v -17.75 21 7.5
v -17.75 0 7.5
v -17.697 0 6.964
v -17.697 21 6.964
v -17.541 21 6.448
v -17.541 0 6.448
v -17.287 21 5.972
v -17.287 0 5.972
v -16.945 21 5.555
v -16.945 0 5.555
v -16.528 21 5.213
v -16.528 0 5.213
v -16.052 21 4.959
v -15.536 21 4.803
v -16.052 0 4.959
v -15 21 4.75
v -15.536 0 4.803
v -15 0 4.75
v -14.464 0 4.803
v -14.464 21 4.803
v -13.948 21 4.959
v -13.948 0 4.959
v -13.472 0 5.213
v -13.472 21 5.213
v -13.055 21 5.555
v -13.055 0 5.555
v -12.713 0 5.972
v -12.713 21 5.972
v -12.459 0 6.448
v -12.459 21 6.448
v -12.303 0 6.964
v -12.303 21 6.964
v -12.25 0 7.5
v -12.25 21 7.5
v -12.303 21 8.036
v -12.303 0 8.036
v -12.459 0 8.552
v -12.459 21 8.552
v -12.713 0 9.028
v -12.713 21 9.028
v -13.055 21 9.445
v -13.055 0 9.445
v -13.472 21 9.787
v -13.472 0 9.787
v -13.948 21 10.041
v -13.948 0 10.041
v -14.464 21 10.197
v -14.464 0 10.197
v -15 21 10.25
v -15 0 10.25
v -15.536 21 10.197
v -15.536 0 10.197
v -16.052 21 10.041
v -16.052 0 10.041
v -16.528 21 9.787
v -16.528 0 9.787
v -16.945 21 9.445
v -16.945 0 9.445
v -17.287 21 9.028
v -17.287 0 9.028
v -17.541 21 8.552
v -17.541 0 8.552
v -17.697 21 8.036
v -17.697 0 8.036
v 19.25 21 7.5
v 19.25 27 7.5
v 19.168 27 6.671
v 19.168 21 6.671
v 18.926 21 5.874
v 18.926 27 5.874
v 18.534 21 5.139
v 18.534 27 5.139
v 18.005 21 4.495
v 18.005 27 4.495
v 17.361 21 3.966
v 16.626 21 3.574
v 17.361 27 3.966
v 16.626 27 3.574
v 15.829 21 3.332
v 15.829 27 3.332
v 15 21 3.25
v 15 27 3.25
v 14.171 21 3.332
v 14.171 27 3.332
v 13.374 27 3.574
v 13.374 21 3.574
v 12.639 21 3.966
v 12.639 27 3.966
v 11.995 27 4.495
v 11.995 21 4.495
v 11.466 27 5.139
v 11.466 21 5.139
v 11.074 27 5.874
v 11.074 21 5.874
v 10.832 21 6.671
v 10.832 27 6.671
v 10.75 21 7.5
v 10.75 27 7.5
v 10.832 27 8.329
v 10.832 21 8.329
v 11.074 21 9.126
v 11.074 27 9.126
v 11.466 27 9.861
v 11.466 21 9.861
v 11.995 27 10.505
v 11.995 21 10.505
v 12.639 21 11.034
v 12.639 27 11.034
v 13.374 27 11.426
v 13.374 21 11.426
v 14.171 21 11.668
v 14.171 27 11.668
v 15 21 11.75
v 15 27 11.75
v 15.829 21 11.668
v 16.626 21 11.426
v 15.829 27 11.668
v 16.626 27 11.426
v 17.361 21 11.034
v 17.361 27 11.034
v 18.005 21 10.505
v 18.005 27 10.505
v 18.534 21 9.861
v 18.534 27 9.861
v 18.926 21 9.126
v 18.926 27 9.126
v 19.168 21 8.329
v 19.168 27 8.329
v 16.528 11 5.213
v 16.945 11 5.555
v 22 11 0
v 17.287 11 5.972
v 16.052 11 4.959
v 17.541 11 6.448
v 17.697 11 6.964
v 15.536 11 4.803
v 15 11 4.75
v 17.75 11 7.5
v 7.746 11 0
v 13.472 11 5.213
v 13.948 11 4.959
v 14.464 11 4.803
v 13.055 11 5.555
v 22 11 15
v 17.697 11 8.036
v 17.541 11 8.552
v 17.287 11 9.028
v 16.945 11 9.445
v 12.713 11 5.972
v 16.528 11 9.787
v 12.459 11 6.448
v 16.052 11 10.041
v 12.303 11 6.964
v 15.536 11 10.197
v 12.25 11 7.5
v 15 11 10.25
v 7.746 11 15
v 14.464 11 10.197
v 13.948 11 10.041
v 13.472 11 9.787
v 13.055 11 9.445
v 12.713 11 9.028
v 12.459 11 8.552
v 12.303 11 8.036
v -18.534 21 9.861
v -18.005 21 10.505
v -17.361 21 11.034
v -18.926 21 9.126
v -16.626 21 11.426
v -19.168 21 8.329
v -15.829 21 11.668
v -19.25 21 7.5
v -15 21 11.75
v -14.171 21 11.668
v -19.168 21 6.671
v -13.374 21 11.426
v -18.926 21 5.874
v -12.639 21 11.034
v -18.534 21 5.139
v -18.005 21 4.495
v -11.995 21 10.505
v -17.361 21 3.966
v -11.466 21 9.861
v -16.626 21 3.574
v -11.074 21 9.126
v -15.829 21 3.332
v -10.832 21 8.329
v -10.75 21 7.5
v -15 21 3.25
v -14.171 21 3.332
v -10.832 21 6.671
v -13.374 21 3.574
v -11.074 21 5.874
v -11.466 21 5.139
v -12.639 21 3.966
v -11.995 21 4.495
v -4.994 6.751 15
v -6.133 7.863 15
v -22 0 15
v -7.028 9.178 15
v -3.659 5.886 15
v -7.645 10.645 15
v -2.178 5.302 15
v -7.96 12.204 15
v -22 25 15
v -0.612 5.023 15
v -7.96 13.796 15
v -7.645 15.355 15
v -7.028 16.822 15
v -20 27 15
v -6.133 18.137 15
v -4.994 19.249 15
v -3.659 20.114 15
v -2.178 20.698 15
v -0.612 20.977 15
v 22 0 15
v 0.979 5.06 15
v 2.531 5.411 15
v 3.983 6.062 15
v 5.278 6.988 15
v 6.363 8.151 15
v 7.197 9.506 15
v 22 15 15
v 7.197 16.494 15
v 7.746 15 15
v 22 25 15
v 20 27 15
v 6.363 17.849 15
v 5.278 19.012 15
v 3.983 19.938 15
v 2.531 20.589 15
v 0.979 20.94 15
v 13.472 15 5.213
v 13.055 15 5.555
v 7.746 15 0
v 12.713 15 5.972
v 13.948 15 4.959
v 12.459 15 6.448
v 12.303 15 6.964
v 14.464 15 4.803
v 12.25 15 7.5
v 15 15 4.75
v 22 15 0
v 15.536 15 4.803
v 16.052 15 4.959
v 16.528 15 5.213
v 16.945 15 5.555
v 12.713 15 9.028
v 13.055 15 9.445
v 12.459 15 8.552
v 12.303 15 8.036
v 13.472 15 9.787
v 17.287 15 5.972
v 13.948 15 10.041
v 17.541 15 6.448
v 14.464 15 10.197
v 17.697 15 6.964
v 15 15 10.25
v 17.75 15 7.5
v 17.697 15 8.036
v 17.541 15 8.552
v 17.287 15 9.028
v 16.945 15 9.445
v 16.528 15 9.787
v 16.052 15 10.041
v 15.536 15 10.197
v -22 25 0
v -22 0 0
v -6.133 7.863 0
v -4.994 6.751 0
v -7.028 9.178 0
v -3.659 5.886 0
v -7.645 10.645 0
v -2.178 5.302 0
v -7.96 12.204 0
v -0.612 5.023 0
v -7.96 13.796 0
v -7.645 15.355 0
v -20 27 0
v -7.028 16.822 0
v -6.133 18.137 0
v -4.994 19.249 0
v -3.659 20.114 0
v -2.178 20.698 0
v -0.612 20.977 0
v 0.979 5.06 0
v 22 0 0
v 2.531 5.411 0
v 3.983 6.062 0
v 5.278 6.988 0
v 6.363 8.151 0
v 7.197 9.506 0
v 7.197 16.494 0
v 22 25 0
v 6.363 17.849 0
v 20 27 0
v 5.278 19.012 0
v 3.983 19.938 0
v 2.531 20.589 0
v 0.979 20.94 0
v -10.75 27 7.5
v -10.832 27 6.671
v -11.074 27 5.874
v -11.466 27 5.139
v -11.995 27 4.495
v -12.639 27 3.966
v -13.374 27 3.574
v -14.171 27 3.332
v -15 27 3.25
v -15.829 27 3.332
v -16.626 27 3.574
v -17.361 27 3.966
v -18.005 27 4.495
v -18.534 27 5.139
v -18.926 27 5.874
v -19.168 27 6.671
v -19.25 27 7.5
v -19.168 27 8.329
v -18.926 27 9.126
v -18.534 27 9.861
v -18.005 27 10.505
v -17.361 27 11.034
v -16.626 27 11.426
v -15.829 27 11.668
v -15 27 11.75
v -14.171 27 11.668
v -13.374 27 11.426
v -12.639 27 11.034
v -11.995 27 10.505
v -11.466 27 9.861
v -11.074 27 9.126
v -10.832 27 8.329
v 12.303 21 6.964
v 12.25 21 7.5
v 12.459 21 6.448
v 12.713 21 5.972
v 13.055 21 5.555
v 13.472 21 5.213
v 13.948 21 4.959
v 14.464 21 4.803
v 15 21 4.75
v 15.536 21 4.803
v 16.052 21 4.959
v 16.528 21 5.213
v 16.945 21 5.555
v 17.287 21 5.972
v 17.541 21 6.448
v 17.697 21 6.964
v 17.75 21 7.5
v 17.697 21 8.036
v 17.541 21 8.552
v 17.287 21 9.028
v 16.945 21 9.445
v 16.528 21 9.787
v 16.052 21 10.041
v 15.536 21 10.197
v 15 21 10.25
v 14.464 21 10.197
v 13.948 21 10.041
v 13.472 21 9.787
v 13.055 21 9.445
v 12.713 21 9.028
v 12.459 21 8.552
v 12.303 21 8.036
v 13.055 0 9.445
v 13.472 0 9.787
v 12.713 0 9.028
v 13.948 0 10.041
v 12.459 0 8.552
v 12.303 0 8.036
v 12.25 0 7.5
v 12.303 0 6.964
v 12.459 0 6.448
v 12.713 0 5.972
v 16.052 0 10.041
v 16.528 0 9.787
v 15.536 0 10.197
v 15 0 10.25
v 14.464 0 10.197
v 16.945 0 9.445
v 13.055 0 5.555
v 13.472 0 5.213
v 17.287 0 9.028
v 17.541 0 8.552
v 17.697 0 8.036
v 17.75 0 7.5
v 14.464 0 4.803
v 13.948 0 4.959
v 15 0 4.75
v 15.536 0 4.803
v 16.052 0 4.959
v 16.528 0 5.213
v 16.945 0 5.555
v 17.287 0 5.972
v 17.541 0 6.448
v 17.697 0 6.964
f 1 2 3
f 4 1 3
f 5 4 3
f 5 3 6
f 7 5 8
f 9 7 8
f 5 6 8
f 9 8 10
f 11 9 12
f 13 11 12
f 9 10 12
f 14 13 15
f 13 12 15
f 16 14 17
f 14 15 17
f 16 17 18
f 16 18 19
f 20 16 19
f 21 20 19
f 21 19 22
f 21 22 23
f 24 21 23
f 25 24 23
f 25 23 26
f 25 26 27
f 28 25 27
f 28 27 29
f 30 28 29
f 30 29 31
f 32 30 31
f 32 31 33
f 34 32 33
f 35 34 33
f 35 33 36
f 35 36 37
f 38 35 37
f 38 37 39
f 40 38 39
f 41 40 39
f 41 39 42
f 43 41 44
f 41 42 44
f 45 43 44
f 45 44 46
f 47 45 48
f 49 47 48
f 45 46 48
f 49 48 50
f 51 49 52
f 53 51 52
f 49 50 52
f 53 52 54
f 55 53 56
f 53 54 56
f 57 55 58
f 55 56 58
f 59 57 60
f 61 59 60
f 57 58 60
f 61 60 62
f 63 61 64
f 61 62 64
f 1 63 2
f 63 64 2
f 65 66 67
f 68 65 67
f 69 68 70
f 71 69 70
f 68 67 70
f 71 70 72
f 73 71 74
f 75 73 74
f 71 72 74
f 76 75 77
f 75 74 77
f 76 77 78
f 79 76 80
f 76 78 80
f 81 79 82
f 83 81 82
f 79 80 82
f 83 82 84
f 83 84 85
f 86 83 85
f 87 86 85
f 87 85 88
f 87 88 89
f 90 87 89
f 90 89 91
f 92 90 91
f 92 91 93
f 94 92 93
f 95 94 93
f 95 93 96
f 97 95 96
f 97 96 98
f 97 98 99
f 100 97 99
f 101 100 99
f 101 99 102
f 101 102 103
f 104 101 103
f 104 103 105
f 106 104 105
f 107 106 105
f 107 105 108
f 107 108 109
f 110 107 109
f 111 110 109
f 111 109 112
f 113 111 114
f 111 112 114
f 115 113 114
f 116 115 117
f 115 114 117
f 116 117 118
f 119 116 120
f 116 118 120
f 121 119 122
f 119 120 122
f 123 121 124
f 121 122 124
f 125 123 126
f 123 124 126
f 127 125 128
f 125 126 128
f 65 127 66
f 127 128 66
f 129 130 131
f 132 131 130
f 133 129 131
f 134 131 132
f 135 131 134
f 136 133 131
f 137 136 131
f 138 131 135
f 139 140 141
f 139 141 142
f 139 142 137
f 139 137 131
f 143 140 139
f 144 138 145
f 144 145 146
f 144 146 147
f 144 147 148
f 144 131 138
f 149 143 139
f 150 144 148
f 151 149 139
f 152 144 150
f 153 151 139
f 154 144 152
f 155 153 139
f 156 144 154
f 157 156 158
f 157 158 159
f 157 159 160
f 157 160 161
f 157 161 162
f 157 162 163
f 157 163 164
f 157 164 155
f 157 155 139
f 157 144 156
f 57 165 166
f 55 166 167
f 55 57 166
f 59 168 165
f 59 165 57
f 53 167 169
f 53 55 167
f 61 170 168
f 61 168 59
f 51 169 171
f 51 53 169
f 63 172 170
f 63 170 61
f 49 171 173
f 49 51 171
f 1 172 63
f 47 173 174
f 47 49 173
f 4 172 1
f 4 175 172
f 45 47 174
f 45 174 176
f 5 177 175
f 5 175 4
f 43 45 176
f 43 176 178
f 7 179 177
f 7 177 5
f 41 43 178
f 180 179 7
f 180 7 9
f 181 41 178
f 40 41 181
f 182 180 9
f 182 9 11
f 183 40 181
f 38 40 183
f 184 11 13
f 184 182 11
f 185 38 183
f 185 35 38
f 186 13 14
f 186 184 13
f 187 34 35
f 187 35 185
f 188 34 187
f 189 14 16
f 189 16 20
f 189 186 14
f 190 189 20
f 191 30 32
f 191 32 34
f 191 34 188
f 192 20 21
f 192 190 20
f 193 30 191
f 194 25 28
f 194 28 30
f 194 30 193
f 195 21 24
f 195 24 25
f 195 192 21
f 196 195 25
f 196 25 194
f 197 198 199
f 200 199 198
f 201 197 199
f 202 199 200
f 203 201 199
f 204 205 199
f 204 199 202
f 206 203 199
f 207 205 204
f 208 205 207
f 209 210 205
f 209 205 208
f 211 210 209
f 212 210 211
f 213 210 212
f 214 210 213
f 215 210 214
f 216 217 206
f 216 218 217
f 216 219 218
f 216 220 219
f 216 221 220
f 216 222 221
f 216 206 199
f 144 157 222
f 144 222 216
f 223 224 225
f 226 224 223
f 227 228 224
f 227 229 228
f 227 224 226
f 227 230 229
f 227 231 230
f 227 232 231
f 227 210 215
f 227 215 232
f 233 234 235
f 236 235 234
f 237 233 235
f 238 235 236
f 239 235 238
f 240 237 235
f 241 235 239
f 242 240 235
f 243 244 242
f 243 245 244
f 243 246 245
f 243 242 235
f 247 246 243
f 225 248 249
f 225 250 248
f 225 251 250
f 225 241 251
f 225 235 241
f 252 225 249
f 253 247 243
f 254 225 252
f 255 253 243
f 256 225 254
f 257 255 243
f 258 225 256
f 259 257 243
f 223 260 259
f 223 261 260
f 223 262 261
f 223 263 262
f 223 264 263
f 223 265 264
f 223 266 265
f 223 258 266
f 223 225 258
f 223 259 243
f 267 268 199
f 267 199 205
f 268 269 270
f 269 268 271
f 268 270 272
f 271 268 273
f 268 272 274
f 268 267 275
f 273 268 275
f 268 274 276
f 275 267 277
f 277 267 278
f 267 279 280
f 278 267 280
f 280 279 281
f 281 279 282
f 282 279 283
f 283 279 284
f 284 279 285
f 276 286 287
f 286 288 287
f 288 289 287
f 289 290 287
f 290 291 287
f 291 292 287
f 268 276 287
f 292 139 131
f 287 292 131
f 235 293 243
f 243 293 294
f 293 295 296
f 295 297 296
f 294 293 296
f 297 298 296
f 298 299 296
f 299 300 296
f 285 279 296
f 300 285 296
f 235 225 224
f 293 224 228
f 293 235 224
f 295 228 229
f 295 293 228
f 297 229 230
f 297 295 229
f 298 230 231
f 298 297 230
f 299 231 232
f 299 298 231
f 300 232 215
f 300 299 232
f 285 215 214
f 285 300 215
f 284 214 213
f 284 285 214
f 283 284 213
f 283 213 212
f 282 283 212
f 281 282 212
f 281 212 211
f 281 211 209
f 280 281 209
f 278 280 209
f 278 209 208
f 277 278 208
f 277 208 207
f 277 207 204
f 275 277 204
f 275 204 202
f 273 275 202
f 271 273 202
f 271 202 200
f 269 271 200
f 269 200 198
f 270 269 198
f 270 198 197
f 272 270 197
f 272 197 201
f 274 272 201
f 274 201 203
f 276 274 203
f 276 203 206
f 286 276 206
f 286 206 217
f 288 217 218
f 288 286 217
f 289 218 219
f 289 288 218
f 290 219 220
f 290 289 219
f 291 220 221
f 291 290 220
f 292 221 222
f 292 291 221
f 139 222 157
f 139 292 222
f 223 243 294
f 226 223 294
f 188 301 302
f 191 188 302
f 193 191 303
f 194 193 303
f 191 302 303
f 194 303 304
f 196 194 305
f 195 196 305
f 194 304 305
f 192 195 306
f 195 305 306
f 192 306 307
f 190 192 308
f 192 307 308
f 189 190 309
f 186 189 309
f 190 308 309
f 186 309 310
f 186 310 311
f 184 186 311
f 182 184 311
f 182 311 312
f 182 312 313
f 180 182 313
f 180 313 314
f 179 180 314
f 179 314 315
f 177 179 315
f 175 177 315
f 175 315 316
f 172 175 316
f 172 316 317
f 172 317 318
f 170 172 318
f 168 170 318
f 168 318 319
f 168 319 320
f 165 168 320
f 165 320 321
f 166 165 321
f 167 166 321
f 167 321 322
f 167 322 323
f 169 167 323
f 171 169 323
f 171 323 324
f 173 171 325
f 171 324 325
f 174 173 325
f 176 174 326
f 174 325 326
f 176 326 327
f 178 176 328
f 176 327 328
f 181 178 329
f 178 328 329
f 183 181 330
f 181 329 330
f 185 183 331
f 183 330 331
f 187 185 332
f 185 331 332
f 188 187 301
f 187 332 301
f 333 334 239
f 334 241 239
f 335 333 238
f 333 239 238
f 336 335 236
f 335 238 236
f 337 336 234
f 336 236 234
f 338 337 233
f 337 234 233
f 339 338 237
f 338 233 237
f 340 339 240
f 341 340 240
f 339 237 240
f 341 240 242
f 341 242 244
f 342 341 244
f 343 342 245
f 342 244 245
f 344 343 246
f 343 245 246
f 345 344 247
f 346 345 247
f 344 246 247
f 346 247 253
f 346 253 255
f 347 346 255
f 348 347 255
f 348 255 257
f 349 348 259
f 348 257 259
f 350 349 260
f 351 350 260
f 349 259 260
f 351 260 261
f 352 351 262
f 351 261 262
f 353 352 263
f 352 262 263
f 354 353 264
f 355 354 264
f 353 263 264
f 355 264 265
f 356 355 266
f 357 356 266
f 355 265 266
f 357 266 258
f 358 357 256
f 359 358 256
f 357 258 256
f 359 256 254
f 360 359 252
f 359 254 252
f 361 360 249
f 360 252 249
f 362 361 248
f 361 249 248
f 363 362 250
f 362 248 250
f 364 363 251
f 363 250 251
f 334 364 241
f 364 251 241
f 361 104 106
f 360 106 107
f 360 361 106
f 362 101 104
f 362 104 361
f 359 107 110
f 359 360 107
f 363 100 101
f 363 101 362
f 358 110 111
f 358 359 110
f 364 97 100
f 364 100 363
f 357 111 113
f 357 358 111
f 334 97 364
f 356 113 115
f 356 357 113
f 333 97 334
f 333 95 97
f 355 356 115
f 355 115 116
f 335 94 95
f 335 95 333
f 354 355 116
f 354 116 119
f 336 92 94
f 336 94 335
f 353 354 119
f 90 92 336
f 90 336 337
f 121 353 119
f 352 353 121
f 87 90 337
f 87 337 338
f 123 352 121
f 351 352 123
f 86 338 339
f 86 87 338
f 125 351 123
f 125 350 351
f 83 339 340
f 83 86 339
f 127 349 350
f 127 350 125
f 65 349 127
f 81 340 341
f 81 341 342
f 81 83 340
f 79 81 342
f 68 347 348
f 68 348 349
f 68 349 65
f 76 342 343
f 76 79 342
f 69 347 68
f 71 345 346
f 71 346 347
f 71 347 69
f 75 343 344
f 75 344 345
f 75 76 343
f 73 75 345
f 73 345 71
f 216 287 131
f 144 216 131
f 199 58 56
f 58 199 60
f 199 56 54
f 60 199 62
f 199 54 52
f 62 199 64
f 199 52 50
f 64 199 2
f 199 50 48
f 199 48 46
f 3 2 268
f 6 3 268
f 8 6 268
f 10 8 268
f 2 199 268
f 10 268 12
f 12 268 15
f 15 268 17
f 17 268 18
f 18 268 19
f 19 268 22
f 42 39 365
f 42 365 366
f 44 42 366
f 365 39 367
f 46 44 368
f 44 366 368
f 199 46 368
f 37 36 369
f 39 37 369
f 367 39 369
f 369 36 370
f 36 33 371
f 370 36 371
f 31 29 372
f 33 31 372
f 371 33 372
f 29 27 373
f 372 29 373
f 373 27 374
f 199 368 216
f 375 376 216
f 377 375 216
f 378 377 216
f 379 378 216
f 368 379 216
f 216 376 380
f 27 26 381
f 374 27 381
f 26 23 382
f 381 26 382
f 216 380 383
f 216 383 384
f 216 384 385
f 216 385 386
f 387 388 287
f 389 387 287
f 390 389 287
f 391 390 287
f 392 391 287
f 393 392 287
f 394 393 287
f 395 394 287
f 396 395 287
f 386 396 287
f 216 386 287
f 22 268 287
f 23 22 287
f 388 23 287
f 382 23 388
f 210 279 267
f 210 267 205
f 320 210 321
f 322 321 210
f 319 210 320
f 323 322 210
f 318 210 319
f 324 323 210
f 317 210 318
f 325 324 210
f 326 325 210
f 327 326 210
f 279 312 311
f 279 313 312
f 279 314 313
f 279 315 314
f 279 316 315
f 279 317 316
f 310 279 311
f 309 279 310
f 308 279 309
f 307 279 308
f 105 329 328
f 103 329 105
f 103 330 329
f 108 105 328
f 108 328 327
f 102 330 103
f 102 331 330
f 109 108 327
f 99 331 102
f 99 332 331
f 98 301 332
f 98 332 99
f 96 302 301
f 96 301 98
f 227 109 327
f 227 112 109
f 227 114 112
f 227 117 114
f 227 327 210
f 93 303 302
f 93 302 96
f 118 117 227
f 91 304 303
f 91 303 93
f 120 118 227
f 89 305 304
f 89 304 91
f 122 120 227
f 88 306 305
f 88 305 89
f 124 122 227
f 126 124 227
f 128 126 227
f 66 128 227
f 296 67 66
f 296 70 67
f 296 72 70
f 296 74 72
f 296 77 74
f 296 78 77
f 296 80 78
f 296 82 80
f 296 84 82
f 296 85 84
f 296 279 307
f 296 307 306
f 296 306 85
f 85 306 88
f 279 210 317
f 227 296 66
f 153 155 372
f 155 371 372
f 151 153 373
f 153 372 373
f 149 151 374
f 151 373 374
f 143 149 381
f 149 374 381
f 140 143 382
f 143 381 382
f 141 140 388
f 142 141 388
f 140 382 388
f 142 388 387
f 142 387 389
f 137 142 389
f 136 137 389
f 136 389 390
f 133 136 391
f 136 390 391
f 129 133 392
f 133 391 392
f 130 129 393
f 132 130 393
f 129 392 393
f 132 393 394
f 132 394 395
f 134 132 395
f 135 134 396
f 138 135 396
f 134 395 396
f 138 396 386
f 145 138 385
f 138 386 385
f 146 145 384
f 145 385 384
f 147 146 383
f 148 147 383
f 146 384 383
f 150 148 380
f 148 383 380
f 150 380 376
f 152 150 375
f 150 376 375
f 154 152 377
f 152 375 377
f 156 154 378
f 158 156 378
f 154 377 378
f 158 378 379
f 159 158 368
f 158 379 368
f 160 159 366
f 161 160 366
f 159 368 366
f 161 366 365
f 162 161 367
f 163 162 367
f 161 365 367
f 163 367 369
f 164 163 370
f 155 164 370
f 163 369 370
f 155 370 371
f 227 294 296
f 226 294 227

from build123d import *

# Parameters (mm, degrees)
SKETCH1_W                                           = 44
SKETCH1_H                                           = 27
SKETCH1_R                                           = 8
BOSS_EXTRUDE1_DEPTH                                 = 15
CBORE_FOR_M5_HEX_SOCKET_HEAD_CAP_SCREW1_D           = 5.5
CBORE_FOR_M5_HEX_SOCKET_HEAD_CAP_SCREW1_DEPTH       = 27
CBORE_FOR_M5_HEX_SOCKET_HEAD_CAP_SCREW1_CBORE_D     = 8.5
CBORE_FOR_M5_HEX_SOCKET_HEAD_CAP_SCREW1_CBORE_DEPTH = 6
CHAMFER1_SIZE                                       = 2
CUT_EXTRUDE1_REACH                                  = 17


with BuildPart() as part:
    # Sketch1 → Boss-Extrude1 (new body)
    with BuildSketch(Plane.XY):
        with Locations((0, 13.5)):
            Rectangle(SKETCH1_W, SKETCH1_H)
        with Locations((0, 13)):
            Circle(SKETCH1_R, mode=Mode.SUBTRACT)
    extrude(amount=BOSS_EXTRUDE1_DEPTH)

    # CBORE for M5 Hex Socket Head Cap Screw1
    with Locations(Plane(origin=(-15, 27, 7.5), x_dir=(1, 0, 0), z_dir=(0, 1, 0))):
        with Locations((0, 0), (30, 0)):
            CounterBoreHole(CBORE_FOR_M5_HEX_SOCKET_HEAD_CAP_SCREW1_D / 2, CBORE_FOR_M5_HEX_SOCKET_HEAD_CAP_SCREW1_CBORE_D / 2, CBORE_FOR_M5_HEX_SOCKET_HEAD_CAP_SCREW1_CBORE_DEPTH, depth=CBORE_FOR_M5_HEX_SOCKET_HEAD_CAP_SCREW1_DEPTH)

    # Chamfer1
    chamfer1_edges = [part.edges().sort_by_distance(p)[0] for p in [
        (-22, 27, 7.5),
        (22, 27, 7.5),
    ]]
    chamfer(chamfer1_edges, length=CHAMFER1_SIZE)

    # Sketch4 → Cut-Extrude1 (cut, up to next)
    with BuildSketch(Plane.XY.offset(15), mode=Mode.PRIVATE) as cut_extrude1_sk1:
        with BuildLine():
            Line((7.745966692, 15), (22, 15))
            Line((22, 15), (22, 11))
            Line((22, 11), (7.745966692, 11))
            ThreePointArc((7.745966692, 11), (8, 13), (7.745966692, 15))
        make_face()
    cut_extrude1_tool1 = extrude(cut_extrude1_sk1.sketch, amount=-CUT_EXTRUDE1_REACH, mode=Mode.PRIVATE) & part.part
    add(cut_extrude1_tool1.solids().sort_by_distance((14.957731, 13, 15))[0], mode=Mode.SUBTRACT)


solid = part.part
